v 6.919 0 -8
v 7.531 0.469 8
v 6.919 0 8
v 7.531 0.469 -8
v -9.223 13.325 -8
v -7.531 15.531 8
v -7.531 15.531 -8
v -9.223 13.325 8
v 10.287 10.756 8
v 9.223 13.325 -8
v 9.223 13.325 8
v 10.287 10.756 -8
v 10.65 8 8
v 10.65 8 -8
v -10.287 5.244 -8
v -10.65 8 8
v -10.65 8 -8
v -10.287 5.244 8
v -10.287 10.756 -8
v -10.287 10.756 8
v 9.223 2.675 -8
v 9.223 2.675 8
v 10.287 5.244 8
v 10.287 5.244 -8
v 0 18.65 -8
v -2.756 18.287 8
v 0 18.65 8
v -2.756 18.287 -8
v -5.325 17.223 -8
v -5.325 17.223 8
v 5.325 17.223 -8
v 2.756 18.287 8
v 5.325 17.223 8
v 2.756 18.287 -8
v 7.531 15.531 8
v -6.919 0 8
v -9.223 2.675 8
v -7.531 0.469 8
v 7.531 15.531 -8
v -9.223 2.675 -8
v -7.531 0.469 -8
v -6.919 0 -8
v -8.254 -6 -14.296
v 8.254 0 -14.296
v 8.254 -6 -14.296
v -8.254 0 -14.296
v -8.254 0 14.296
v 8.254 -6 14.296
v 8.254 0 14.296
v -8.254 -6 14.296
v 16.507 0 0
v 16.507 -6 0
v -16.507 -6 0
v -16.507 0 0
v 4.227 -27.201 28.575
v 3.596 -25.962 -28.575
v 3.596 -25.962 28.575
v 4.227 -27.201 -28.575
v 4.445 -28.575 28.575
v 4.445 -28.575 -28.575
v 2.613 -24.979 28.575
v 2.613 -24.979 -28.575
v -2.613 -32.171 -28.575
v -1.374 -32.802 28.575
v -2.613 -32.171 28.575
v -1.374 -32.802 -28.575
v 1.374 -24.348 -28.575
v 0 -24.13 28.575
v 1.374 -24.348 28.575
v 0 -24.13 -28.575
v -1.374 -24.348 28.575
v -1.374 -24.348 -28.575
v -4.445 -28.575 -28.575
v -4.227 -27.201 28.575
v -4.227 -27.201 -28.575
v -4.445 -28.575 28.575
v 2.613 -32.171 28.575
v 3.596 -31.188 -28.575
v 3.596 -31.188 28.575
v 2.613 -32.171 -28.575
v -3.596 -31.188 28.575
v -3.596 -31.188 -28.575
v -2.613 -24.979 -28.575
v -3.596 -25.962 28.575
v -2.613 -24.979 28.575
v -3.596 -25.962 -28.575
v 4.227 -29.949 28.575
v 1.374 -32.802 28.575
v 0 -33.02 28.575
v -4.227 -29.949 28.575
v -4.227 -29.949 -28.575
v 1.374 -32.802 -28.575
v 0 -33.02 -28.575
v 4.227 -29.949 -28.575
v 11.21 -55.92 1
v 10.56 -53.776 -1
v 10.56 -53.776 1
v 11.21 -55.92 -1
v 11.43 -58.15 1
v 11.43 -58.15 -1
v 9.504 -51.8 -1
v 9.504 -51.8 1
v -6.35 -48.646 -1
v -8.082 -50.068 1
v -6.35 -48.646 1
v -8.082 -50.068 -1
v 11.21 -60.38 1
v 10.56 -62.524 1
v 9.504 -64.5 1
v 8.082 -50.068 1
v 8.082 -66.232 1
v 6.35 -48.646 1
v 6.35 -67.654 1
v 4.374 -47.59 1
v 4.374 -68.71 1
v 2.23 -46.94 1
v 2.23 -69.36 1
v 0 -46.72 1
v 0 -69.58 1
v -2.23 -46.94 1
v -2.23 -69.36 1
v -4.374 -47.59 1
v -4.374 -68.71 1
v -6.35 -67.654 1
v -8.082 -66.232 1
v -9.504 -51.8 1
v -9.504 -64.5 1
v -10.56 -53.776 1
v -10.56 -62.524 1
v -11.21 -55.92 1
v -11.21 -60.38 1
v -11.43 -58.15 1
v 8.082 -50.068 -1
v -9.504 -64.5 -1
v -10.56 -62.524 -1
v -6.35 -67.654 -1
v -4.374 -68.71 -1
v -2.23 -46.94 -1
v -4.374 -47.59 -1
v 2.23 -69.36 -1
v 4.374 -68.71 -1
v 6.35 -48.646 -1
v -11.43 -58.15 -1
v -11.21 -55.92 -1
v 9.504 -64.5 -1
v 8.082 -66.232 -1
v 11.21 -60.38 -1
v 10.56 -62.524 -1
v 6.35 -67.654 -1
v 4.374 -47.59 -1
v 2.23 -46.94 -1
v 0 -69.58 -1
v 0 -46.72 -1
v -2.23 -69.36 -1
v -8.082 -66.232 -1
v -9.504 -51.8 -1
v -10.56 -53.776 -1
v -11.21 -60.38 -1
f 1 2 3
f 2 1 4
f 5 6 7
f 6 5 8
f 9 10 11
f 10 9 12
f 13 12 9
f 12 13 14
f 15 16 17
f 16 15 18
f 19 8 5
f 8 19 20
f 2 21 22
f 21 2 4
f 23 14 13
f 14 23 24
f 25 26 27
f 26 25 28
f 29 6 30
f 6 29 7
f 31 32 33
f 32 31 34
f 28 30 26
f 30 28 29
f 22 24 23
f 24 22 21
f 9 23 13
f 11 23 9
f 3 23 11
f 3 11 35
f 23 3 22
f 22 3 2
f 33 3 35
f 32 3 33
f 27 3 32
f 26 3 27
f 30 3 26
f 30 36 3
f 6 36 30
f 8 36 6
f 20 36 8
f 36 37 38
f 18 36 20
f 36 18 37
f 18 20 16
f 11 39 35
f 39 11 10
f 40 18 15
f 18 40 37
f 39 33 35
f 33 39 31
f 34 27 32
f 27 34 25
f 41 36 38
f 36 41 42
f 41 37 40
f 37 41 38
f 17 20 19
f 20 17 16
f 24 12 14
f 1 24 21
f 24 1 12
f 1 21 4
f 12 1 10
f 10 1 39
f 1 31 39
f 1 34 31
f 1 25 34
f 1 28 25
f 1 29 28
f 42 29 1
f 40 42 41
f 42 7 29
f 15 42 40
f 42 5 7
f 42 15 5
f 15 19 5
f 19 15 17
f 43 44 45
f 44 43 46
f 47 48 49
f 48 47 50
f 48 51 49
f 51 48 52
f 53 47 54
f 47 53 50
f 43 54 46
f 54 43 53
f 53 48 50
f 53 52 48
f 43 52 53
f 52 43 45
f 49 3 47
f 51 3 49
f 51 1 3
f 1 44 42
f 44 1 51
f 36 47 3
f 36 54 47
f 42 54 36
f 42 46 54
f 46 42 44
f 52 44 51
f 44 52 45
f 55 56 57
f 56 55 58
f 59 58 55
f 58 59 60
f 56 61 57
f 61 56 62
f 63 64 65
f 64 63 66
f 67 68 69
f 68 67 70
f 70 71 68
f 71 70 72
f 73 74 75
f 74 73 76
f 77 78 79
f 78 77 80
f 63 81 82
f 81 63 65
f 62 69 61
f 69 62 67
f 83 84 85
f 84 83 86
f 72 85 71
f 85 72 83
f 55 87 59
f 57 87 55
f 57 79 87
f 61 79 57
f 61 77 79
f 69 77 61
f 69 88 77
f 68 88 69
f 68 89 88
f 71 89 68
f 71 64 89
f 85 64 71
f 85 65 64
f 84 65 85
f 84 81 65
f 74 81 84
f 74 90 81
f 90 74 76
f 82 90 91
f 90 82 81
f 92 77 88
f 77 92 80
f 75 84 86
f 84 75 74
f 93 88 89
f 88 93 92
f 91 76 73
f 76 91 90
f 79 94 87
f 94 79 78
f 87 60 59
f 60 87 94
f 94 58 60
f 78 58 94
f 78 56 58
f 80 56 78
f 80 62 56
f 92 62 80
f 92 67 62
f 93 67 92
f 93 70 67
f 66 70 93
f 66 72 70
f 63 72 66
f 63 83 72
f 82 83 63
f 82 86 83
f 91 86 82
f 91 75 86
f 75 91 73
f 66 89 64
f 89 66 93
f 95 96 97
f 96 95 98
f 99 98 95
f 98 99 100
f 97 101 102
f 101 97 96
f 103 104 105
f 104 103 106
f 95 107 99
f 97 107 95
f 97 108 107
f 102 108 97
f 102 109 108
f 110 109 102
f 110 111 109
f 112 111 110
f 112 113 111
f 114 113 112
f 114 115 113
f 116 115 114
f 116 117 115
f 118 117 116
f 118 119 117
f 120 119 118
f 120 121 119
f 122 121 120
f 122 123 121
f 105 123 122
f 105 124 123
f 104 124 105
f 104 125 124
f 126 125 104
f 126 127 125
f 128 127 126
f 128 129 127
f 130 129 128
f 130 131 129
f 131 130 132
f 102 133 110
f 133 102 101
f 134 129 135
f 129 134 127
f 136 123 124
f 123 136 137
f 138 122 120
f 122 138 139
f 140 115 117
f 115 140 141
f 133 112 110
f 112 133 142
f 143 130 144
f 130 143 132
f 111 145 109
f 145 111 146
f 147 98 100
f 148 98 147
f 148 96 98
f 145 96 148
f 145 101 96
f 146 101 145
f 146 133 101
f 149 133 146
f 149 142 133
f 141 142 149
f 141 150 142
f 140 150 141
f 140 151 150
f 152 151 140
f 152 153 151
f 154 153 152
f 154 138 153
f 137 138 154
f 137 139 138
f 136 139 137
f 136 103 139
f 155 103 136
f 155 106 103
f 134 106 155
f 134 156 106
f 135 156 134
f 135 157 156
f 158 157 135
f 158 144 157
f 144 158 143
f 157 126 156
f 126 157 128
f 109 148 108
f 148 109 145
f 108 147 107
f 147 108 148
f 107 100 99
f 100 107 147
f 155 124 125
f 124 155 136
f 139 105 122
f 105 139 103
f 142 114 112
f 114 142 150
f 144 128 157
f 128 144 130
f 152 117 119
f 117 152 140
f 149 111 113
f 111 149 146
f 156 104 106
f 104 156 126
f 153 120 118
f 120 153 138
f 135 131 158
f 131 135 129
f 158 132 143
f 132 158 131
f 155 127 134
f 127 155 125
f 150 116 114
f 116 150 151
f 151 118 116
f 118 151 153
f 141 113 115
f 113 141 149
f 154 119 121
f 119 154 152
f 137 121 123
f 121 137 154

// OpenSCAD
// Auto-generated by scripts/author_from_manifest.py (Phase D.3).
// Source: data/phase_d_manifest.json (sku_intent='tyco-ty3251-pendent-286f').
// Do not hand-edit — regenerate from the manifest.
//
// @part tyco_ty3251_pendent_286f
// @kind sprinkler_head
// @category head.pendant.k56
// @display-name "Tyco TY3251 Pendent K5.6 SR 286°F"
// @mfg tyco_fire_protection
// @mfg-pn TY3251
// @listing UL FM
// @hazard-classes LH OH1
// @price-usd 14.20
// @install-minutes 8
// @crew journeyman
// @k-factor 5.6
// @orientation pendant
// @response standard
// @temperature 286F
// @param size_in number default=0.5 label="Size" unit="in"
// @port inlet position=[0,0.014,0] direction=[0,1,0] style=NPT_threaded size_in=0.5 role=drop

size_in = 0.5;
k_factor = 5.6;

length_mm   = 57.15;
body_dia_mm = 25.40;
thread_od   = 21.3;
thread_len  = 16;
deflector_d = body_dia_mm * 0.9;

 union() {
    translate([0, thread_len/2, 0])
        cylinder(h = thread_len, d = thread_od, center = true, $fn = 24);
    translate([0, -3, 0])
        rotate([90, 0, 0])
        cylinder(h = 6, d = thread_od * 1.55, $fn = 6, center = true);
    translate([0, -length_mm/2, 0])
        cylinder(h = length_mm, d = body_dia_mm * 0.35, center = true, $fn = 20);
    translate([0, -length_mm - 1, 0])
        cylinder(h = 2, d = deflector_d, center = true, $fn = 32);
}
